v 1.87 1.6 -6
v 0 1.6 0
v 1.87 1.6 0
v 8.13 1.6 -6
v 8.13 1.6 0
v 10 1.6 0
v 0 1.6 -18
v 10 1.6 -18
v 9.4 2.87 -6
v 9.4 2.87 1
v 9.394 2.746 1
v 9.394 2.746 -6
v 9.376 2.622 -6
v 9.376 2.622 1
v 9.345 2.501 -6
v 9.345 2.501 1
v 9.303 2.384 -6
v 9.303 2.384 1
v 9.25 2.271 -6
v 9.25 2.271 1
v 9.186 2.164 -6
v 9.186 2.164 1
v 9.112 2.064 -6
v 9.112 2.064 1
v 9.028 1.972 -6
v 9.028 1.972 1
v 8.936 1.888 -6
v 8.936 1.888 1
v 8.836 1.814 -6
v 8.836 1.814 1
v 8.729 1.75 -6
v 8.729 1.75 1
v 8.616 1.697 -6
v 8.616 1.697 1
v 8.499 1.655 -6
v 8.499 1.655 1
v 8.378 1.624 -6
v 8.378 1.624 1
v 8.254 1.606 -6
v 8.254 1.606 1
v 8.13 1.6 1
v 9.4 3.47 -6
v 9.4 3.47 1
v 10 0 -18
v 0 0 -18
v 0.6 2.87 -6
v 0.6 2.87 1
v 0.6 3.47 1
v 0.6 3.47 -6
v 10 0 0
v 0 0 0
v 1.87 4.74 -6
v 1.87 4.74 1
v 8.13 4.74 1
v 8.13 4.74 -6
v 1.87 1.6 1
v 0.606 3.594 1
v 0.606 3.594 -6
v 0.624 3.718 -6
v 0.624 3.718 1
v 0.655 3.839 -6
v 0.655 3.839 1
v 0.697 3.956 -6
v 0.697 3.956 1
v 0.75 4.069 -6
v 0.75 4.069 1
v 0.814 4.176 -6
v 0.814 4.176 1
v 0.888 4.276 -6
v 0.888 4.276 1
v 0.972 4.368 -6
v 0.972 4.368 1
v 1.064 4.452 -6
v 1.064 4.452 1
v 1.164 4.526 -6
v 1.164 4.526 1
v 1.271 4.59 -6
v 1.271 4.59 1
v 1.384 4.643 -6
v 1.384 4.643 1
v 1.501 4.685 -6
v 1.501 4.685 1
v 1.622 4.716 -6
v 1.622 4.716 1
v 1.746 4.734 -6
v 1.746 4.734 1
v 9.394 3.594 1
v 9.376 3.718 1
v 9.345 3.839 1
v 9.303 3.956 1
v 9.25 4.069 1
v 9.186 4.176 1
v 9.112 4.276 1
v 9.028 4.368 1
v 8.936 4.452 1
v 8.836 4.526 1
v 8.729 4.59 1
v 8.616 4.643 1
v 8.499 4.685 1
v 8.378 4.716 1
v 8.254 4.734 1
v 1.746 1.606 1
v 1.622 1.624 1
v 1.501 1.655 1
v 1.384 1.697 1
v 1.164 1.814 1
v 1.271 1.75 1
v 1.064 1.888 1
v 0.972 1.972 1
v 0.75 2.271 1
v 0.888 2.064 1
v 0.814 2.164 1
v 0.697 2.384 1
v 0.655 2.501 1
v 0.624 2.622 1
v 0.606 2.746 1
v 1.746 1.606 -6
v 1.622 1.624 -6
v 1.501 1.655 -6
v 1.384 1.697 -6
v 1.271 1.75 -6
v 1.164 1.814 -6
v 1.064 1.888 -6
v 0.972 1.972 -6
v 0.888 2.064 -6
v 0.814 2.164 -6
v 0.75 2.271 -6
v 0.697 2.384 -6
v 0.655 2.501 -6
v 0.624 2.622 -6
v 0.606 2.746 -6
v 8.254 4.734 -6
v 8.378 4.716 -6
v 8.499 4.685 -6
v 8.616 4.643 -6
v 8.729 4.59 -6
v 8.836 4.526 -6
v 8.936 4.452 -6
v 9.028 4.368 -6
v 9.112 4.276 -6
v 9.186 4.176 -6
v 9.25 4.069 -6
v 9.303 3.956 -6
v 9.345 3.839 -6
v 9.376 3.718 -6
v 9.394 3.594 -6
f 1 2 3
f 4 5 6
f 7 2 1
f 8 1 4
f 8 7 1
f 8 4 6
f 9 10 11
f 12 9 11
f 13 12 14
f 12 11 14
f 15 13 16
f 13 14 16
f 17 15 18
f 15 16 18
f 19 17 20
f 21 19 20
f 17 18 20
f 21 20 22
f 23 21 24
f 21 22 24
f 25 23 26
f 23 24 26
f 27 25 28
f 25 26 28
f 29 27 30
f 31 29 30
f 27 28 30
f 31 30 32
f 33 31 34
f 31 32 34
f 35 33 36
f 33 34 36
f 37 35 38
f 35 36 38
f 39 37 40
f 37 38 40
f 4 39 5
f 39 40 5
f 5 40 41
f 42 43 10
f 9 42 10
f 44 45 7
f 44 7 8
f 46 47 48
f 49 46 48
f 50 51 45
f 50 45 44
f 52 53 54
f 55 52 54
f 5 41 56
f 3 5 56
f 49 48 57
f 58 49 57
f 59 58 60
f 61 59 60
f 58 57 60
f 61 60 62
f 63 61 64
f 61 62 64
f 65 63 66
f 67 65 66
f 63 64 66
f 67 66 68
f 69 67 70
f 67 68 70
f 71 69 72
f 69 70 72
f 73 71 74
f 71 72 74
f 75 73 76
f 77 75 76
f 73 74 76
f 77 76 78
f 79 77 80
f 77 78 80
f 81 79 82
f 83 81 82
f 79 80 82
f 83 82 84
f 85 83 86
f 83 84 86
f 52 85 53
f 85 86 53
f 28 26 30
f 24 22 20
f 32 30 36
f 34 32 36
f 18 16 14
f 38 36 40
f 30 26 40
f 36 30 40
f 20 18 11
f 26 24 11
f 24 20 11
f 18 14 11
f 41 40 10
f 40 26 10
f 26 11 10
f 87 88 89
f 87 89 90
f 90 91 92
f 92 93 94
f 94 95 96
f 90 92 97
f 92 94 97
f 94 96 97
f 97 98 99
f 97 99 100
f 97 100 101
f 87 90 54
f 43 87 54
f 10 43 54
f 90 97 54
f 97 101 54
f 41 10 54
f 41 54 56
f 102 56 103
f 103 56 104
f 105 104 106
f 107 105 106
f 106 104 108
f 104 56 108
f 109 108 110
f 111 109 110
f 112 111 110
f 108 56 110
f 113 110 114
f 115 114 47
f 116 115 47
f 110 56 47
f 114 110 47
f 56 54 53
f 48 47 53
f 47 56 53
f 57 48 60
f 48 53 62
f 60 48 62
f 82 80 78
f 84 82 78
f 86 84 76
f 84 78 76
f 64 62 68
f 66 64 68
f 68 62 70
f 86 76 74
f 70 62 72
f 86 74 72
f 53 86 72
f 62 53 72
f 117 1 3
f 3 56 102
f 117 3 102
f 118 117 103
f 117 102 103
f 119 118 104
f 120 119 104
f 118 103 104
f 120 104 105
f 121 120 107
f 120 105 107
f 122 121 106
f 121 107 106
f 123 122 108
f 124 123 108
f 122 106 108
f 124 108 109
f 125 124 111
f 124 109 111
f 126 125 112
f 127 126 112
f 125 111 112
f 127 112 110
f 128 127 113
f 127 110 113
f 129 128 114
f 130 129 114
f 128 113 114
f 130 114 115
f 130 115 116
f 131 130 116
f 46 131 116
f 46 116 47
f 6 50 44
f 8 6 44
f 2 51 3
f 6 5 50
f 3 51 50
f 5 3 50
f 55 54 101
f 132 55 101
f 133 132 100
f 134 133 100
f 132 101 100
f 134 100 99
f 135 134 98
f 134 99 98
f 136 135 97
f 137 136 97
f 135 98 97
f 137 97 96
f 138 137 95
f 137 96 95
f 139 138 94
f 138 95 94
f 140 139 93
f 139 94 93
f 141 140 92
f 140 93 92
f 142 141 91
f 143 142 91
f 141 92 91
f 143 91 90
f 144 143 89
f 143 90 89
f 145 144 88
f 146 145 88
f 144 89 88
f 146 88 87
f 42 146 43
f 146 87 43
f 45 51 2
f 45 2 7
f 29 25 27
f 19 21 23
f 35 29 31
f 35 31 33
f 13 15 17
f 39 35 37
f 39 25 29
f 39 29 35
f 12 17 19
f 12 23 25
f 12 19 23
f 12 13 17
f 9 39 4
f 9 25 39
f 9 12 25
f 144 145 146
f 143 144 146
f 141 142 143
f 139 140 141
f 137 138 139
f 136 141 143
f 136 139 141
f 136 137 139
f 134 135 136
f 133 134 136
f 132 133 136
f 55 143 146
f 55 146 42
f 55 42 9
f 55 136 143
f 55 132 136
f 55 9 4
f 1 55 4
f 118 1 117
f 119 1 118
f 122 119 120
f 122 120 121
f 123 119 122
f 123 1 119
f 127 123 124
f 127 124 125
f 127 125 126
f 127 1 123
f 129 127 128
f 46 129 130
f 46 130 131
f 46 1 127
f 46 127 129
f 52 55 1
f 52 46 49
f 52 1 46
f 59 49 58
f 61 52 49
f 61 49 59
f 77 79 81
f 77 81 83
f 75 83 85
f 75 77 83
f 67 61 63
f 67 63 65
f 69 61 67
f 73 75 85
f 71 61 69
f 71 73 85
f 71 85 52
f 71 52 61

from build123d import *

# Parameters (mm, degrees)
SKETCH1_W           = 10
SKETCH1_H           = 18
BOSS_EXTRUDE1_DEPTH = 1.6
BOSS_EXTRUDE2_DEPTH = 7


with BuildPart() as part:
    # Sketch1 → Boss-Extrude1 (new body)
    with BuildSketch(Plane(origin=(0, 0, 0), x_dir=(1, 0, 0), z_dir=(0, 1, 0))):
        with Locations((5, 9)):
            Rectangle(SKETCH1_W, SKETCH1_H)
    extrude(amount=BOSS_EXTRUDE1_DEPTH)

    # Sketch3 → Boss-Extrude2 (add)
    with BuildSketch(Plane.XY.offset(1)):
        with BuildLine():
            Line((1.87, 4.74), (8.13, 4.74))
            ThreePointArc((8.13, 4.74), (9.028025612, 4.368025612), (9.4, 3.47))
            Line((9.4, 3.47), (9.4, 2.87))
            ThreePointArc((9.4, 2.87), (9.028025612, 1.971974388), (8.13, 1.6))
            Line((8.13, 1.6), (1.87, 1.6))
            ThreePointArc((1.87, 1.6), (0.971974388, 1.971974388), (0.6, 2.87))
            Line((0.6, 2.87), (0.6, 3.47))
            ThreePointArc((0.6, 3.47), (0.971974388, 4.368025612), (1.87, 4.74))
        make_face()
    extrude(amount=-BOSS_EXTRUDE2_DEPTH)


solid = part.part
